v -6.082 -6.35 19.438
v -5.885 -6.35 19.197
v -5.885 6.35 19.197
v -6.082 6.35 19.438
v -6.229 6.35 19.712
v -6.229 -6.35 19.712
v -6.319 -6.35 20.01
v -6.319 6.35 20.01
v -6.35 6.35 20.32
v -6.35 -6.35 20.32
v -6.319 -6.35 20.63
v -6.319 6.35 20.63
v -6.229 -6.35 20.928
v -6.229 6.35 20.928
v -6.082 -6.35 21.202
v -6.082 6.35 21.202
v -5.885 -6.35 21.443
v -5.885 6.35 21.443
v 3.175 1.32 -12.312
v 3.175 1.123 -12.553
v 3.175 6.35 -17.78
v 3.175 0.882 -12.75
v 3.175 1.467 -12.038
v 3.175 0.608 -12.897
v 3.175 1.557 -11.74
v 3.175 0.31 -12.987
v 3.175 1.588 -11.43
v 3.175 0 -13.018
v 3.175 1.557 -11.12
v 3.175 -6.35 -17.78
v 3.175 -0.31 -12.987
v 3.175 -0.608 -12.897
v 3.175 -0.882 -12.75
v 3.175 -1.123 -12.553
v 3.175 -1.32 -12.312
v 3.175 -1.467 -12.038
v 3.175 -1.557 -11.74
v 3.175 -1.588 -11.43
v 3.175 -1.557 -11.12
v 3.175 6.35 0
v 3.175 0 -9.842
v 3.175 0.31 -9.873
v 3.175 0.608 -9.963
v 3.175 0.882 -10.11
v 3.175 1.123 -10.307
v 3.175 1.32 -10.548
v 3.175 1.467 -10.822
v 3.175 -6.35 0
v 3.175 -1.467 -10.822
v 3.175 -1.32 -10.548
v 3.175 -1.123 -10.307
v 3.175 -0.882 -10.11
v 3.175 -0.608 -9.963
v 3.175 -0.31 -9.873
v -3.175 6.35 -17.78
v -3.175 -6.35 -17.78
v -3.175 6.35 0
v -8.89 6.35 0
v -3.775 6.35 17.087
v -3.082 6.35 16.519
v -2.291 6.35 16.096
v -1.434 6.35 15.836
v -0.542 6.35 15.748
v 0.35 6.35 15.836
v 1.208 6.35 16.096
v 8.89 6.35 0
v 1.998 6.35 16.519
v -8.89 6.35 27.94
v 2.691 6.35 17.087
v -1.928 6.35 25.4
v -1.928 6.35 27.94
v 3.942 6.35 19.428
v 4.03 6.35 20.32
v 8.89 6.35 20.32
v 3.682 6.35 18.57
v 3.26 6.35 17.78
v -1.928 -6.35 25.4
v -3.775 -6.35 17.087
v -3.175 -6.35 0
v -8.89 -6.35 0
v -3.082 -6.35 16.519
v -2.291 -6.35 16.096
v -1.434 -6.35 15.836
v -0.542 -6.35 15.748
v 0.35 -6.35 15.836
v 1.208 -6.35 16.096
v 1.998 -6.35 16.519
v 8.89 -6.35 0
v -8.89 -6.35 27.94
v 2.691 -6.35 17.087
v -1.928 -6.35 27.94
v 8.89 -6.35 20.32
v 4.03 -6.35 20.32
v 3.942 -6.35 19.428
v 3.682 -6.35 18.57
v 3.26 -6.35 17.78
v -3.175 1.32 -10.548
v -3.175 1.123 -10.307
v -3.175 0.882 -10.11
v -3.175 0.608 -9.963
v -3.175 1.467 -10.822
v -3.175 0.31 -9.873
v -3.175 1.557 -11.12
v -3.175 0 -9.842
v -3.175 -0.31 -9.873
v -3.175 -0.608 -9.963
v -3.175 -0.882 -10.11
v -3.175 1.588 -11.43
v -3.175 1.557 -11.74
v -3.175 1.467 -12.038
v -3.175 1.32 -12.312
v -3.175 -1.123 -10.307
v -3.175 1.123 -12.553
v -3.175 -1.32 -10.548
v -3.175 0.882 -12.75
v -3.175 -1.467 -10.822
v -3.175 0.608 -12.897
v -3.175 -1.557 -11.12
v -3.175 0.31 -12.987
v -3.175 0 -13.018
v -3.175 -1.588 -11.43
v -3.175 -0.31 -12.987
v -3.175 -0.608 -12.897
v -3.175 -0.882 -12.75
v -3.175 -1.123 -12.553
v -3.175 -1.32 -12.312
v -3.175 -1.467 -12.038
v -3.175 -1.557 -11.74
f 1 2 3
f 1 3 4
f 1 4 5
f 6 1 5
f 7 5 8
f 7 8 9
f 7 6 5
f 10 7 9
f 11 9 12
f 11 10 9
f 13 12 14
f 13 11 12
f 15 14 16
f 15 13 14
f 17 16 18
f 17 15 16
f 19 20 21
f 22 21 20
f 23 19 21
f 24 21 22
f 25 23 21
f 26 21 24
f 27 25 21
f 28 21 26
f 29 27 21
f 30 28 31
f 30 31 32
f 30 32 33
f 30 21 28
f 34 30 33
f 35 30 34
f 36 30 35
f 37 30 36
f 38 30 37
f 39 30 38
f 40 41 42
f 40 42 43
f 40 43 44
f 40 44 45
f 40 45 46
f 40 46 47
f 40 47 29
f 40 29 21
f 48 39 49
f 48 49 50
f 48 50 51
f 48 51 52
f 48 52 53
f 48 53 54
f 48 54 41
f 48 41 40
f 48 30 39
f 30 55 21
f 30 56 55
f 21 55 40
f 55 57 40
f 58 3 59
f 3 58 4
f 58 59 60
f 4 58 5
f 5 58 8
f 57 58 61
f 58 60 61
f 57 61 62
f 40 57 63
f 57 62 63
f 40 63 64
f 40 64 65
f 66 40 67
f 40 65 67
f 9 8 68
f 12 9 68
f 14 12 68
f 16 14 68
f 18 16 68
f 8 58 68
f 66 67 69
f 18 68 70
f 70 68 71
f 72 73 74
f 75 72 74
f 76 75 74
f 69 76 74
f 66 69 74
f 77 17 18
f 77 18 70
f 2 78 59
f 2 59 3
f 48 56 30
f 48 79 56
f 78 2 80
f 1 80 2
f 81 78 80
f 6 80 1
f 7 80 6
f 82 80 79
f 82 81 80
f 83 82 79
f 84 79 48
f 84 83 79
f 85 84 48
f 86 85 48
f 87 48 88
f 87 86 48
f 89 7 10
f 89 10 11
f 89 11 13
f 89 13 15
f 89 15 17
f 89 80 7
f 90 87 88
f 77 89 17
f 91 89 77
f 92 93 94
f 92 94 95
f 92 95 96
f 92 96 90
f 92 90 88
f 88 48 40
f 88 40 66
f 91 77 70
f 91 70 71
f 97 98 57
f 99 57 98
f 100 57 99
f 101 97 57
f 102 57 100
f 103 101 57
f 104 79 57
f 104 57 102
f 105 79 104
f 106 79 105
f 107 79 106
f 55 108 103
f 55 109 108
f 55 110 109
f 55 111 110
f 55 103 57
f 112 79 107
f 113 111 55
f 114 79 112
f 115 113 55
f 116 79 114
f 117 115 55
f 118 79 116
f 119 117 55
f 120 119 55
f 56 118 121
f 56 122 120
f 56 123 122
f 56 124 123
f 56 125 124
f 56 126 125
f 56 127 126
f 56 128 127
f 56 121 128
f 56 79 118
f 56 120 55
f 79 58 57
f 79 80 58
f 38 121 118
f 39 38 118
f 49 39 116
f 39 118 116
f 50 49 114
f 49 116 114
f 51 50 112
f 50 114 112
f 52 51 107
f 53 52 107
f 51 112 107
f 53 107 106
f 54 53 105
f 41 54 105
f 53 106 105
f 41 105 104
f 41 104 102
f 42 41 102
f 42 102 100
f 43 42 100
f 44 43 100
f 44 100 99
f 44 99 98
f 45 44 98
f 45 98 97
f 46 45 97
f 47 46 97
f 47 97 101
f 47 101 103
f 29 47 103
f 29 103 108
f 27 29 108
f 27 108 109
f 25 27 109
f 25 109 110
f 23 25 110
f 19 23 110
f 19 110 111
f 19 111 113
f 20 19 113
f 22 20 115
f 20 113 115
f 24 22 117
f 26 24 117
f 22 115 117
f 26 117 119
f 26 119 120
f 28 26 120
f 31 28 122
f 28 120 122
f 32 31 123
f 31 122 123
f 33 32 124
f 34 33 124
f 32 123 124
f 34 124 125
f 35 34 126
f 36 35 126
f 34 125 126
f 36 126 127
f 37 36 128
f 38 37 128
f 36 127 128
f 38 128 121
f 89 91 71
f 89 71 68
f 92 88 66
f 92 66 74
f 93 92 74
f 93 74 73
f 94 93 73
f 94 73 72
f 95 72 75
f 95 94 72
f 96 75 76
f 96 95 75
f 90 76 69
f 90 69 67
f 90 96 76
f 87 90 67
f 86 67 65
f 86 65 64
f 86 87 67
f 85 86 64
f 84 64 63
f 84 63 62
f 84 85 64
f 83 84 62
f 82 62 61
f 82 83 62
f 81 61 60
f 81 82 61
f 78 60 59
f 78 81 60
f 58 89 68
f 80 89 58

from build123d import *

# Parameters (mm, degrees)
F1_DEPTH = 6.35
F2_R     = 1.5875
F3_DEPTH = 12.066


with BuildPart() as f1:
    # F0 (on Front) → F1 (new body, symmetric)
    with BuildSketch(Plane.XZ):
        with BuildLine():
            Line((-3.175, -17.78), (3.175, -17.78))
            Line((3.175, -17.78), (3.175, 0))
            Line((3.175, 0), (8.89, 0))
            Line((8.89, 0), (8.89, 20.32))
            Line((8.89, 20.32), (4.03022, 20.32))
            ThreePointArc((4.03022, 20.32), (1.207849, 16.096023), (-3.774672, 17.087108))
            Line((-3.774672, 17.087108), (-5.885032, 19.197468))
            ThreePointArc((-5.885032, 19.197468), (-6.35, 20.32), (-5.885032, 21.442532))
            Line((-5.885032, 21.442532), (-1.927564, 25.4))
            Line((-1.927564, 25.4), (-1.927564, 27.94))
            Line((-1.927564, 27.94), (-8.89, 27.94))
            Line((-8.89, 27.94), (-8.89, 0))
            Line((-8.89, 0), (-3.175, 0))
            Line((-3.175, 0), (-3.175, -17.78))
        make_face()
    extrude(amount=F1_DEPTH, both=True)

    # F2 (on face) → F3 (cut, through all)
    with BuildSketch(Plane(origin=(-3.175, 0, 0), x_dir=(0, -1, 0), z_dir=(-1, 0, 0))):
        with Locations((0, -11.43)):
            Circle(F2_R)
    extrude(amount=-F3_DEPTH, mode=Mode.SUBTRACT)


solid = f1.part
